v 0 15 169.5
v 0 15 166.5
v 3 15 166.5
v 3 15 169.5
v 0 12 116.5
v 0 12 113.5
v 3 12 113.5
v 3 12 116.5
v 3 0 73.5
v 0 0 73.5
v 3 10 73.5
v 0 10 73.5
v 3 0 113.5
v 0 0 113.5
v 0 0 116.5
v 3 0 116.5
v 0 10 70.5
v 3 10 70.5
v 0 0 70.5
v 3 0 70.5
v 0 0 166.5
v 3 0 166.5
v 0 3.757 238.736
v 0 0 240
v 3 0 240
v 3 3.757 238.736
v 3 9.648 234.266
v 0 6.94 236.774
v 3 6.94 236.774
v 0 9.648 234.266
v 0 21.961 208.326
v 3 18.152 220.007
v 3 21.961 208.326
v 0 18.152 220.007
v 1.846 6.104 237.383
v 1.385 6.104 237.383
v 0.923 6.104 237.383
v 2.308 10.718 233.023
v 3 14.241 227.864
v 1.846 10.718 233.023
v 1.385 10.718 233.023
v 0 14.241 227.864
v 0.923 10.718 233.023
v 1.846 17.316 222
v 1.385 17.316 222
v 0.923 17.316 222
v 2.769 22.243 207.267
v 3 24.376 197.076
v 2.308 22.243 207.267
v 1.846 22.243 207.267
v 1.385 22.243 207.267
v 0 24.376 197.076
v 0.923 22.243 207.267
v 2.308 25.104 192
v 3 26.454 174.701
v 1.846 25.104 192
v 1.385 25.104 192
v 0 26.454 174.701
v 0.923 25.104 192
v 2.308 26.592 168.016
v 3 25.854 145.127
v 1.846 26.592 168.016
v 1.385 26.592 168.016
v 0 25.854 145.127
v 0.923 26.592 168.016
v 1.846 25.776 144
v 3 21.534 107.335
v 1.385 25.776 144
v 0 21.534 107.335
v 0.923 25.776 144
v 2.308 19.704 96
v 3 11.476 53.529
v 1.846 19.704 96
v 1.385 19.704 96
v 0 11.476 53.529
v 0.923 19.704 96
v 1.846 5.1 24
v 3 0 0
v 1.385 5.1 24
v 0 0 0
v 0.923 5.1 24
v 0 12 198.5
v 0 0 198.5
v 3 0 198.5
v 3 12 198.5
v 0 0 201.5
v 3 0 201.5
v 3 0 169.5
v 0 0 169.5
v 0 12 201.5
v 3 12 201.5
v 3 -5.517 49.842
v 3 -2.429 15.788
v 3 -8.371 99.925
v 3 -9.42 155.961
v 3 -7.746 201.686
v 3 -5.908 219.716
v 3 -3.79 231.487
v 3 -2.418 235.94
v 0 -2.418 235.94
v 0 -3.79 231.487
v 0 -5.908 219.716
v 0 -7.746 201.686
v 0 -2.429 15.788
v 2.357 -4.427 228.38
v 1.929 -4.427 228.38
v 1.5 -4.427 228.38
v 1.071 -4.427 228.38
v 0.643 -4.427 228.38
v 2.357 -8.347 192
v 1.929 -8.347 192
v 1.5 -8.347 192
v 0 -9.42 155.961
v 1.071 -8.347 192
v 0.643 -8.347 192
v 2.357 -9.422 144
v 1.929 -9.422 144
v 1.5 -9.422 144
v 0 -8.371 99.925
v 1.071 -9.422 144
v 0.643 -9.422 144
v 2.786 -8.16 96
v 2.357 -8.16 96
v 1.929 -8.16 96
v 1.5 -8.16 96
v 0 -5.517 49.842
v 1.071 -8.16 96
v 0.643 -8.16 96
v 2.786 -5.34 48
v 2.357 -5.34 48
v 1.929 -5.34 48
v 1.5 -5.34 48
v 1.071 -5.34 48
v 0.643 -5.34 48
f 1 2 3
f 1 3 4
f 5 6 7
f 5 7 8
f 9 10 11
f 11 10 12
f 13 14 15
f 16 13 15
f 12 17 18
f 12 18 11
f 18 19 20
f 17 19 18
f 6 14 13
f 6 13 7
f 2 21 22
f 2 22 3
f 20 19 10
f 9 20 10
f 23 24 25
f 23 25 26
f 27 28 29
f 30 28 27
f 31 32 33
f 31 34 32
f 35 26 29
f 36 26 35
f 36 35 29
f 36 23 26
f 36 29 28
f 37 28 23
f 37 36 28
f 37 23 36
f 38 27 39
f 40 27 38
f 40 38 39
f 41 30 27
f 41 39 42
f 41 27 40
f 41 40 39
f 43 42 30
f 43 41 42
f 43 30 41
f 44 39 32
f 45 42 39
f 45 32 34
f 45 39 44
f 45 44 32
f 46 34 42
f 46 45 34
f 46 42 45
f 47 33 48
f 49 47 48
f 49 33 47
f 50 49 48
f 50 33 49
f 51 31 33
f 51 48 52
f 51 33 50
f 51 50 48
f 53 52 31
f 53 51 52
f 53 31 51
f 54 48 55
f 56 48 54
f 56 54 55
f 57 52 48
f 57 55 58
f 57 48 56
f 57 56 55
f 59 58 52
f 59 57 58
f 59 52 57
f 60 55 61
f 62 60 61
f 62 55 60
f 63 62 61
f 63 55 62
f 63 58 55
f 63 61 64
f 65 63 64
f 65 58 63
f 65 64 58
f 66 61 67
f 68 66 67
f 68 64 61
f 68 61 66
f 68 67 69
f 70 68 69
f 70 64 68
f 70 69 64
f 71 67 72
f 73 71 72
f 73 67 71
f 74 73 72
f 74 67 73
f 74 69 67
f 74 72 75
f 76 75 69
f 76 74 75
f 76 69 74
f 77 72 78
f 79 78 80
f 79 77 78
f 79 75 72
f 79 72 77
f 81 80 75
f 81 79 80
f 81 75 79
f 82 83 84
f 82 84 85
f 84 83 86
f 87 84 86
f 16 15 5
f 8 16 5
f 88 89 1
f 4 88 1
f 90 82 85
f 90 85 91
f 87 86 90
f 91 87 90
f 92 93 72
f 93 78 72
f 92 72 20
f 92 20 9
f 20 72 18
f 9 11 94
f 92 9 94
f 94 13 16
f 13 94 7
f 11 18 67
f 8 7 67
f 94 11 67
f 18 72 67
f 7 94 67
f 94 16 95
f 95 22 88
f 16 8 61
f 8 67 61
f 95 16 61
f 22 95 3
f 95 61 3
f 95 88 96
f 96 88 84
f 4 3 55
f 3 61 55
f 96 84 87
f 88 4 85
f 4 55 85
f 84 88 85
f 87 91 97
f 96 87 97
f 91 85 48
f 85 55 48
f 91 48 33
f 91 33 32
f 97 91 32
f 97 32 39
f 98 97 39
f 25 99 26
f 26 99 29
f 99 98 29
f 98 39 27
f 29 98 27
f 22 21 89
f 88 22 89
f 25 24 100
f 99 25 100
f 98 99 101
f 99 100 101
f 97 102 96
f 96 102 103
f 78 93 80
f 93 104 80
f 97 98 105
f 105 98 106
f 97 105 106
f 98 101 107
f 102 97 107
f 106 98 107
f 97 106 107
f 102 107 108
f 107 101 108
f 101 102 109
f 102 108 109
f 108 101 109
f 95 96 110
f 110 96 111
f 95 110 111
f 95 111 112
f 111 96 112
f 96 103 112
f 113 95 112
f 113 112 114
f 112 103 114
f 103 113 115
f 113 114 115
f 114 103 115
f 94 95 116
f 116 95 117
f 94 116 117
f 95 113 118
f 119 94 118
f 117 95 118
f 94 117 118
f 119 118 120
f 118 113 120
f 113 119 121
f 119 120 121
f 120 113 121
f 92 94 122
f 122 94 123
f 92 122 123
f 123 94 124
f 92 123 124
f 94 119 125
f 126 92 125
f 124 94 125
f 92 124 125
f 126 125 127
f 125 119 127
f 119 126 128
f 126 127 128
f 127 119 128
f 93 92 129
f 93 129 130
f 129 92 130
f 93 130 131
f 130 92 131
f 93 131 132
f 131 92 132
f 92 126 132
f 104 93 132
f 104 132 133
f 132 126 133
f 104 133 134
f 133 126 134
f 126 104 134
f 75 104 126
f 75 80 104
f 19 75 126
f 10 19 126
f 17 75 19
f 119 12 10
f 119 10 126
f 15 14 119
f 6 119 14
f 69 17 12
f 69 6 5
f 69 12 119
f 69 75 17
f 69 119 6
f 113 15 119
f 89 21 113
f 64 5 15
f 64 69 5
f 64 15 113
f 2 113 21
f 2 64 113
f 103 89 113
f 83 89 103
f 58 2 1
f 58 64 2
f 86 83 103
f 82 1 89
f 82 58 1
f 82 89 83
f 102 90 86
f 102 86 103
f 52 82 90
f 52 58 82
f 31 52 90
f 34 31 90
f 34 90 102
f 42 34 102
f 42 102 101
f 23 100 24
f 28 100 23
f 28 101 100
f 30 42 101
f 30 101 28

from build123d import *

# Parameters (mm, degrees)
EXTRUDE_1_DEPTH     = 3
SKETCH_2_W          = 3
SKETCH_2_H          = 12
SKETCH_2_H_2        = 15
SKETCH_2_H_3        = 10
CUT_EXTRUDE_1_DEPTH = 3


with BuildPart() as part:
    # Эскиз1 → Бобышка-Вытянуть1 (new body)
    with BuildSketch(Plane(origin=(0, 0, 0), x_dir=(0, 0, -1), z_dir=(1, 0, 0))):
        with BuildLine():
            add(Edge.make_bspline(
                [(-240, 0), (-238.539586148, 6.885975956), (-231.6119689, 12.33782744), (-222.175332595, 17.412091216), (-214.111867769, 20.343482826), (-204.156129061, 23.263904239), (-188.104616678, 25.89332168), (-168.007150597, 26.960143982), (-143.945589986, 26.026388226), (-119.918298994, 23.567750867), (-95.953760008, 19.758812003), (-71.912657951, 15.561977026), (-48.005978392, 10.220578603), (-23.989791717, 5.171383231), (-8.037469261, 1.523600682), (0, 0)],
                knots=[0, 0, 0, 0, 0.075346011, 0.102327605, 0.127890212, 0.177564304, 0.226024831, 0.321726685, 0.417300323, 0.513304723, 0.609920295, 0.706973803, 0.804635001, 0.902346226, 1, 1, 1, 1], degree=3))
            add(Edge.make_bspline(
                [(-240, 0), (-236.52391179, -2.886637123), (-230.220810861, -4.067786061), (-222.028601874, -5.648779907), (-214.009642515, -6.608514015), (-204.019456847, -7.65058139), (-188.010543644, -8.621004369), (-168.008371033, -9.355028053), (-143.997445941, -9.544655848), (-119.996434598, -9.000571646), (-95.984120714, -8.452313319), (-79.444451482, -6.861549256), (-63.412851028, -6.941357818), (-47.421480018, -5.149296578), (-23.951991061, -3.34616289), (-7.916011456, -1.672238148), (0, 0)],
                knots=[0, 0, 0, 0, 0.053475274, 0.07870931, 0.103753204, 0.153672751, 0.203448049, 0.302856431, 0.40219897, 0.501554025, 0.600954522, 0.700430481, 0.707480416, 0.799996455, 0.899715685, 1, 1, 1, 1], degree=3))
        make_face()
    extrude(amount=EXTRUDE_1_DEPTH)

    # Эскиз2 → Вырез-Вытянуть1 (cut)
    with BuildSketch(Plane.ZY):
        with Locations((115, 6)):
            Rectangle(SKETCH_2_W, SKETCH_2_H)
        with Locations((200, 6)):
            Rectangle(SKETCH_2_W, SKETCH_2_H)
        with Locations((168, 7.5)):
            Rectangle(SKETCH_2_W, SKETCH_2_H_2)
        with Locations((72, 5)):
            Rectangle(SKETCH_2_W, SKETCH_2_H_3)
    extrude(amount=-CUT_EXTRUDE_1_DEPTH, mode=Mode.SUBTRACT)


solid = part.part
